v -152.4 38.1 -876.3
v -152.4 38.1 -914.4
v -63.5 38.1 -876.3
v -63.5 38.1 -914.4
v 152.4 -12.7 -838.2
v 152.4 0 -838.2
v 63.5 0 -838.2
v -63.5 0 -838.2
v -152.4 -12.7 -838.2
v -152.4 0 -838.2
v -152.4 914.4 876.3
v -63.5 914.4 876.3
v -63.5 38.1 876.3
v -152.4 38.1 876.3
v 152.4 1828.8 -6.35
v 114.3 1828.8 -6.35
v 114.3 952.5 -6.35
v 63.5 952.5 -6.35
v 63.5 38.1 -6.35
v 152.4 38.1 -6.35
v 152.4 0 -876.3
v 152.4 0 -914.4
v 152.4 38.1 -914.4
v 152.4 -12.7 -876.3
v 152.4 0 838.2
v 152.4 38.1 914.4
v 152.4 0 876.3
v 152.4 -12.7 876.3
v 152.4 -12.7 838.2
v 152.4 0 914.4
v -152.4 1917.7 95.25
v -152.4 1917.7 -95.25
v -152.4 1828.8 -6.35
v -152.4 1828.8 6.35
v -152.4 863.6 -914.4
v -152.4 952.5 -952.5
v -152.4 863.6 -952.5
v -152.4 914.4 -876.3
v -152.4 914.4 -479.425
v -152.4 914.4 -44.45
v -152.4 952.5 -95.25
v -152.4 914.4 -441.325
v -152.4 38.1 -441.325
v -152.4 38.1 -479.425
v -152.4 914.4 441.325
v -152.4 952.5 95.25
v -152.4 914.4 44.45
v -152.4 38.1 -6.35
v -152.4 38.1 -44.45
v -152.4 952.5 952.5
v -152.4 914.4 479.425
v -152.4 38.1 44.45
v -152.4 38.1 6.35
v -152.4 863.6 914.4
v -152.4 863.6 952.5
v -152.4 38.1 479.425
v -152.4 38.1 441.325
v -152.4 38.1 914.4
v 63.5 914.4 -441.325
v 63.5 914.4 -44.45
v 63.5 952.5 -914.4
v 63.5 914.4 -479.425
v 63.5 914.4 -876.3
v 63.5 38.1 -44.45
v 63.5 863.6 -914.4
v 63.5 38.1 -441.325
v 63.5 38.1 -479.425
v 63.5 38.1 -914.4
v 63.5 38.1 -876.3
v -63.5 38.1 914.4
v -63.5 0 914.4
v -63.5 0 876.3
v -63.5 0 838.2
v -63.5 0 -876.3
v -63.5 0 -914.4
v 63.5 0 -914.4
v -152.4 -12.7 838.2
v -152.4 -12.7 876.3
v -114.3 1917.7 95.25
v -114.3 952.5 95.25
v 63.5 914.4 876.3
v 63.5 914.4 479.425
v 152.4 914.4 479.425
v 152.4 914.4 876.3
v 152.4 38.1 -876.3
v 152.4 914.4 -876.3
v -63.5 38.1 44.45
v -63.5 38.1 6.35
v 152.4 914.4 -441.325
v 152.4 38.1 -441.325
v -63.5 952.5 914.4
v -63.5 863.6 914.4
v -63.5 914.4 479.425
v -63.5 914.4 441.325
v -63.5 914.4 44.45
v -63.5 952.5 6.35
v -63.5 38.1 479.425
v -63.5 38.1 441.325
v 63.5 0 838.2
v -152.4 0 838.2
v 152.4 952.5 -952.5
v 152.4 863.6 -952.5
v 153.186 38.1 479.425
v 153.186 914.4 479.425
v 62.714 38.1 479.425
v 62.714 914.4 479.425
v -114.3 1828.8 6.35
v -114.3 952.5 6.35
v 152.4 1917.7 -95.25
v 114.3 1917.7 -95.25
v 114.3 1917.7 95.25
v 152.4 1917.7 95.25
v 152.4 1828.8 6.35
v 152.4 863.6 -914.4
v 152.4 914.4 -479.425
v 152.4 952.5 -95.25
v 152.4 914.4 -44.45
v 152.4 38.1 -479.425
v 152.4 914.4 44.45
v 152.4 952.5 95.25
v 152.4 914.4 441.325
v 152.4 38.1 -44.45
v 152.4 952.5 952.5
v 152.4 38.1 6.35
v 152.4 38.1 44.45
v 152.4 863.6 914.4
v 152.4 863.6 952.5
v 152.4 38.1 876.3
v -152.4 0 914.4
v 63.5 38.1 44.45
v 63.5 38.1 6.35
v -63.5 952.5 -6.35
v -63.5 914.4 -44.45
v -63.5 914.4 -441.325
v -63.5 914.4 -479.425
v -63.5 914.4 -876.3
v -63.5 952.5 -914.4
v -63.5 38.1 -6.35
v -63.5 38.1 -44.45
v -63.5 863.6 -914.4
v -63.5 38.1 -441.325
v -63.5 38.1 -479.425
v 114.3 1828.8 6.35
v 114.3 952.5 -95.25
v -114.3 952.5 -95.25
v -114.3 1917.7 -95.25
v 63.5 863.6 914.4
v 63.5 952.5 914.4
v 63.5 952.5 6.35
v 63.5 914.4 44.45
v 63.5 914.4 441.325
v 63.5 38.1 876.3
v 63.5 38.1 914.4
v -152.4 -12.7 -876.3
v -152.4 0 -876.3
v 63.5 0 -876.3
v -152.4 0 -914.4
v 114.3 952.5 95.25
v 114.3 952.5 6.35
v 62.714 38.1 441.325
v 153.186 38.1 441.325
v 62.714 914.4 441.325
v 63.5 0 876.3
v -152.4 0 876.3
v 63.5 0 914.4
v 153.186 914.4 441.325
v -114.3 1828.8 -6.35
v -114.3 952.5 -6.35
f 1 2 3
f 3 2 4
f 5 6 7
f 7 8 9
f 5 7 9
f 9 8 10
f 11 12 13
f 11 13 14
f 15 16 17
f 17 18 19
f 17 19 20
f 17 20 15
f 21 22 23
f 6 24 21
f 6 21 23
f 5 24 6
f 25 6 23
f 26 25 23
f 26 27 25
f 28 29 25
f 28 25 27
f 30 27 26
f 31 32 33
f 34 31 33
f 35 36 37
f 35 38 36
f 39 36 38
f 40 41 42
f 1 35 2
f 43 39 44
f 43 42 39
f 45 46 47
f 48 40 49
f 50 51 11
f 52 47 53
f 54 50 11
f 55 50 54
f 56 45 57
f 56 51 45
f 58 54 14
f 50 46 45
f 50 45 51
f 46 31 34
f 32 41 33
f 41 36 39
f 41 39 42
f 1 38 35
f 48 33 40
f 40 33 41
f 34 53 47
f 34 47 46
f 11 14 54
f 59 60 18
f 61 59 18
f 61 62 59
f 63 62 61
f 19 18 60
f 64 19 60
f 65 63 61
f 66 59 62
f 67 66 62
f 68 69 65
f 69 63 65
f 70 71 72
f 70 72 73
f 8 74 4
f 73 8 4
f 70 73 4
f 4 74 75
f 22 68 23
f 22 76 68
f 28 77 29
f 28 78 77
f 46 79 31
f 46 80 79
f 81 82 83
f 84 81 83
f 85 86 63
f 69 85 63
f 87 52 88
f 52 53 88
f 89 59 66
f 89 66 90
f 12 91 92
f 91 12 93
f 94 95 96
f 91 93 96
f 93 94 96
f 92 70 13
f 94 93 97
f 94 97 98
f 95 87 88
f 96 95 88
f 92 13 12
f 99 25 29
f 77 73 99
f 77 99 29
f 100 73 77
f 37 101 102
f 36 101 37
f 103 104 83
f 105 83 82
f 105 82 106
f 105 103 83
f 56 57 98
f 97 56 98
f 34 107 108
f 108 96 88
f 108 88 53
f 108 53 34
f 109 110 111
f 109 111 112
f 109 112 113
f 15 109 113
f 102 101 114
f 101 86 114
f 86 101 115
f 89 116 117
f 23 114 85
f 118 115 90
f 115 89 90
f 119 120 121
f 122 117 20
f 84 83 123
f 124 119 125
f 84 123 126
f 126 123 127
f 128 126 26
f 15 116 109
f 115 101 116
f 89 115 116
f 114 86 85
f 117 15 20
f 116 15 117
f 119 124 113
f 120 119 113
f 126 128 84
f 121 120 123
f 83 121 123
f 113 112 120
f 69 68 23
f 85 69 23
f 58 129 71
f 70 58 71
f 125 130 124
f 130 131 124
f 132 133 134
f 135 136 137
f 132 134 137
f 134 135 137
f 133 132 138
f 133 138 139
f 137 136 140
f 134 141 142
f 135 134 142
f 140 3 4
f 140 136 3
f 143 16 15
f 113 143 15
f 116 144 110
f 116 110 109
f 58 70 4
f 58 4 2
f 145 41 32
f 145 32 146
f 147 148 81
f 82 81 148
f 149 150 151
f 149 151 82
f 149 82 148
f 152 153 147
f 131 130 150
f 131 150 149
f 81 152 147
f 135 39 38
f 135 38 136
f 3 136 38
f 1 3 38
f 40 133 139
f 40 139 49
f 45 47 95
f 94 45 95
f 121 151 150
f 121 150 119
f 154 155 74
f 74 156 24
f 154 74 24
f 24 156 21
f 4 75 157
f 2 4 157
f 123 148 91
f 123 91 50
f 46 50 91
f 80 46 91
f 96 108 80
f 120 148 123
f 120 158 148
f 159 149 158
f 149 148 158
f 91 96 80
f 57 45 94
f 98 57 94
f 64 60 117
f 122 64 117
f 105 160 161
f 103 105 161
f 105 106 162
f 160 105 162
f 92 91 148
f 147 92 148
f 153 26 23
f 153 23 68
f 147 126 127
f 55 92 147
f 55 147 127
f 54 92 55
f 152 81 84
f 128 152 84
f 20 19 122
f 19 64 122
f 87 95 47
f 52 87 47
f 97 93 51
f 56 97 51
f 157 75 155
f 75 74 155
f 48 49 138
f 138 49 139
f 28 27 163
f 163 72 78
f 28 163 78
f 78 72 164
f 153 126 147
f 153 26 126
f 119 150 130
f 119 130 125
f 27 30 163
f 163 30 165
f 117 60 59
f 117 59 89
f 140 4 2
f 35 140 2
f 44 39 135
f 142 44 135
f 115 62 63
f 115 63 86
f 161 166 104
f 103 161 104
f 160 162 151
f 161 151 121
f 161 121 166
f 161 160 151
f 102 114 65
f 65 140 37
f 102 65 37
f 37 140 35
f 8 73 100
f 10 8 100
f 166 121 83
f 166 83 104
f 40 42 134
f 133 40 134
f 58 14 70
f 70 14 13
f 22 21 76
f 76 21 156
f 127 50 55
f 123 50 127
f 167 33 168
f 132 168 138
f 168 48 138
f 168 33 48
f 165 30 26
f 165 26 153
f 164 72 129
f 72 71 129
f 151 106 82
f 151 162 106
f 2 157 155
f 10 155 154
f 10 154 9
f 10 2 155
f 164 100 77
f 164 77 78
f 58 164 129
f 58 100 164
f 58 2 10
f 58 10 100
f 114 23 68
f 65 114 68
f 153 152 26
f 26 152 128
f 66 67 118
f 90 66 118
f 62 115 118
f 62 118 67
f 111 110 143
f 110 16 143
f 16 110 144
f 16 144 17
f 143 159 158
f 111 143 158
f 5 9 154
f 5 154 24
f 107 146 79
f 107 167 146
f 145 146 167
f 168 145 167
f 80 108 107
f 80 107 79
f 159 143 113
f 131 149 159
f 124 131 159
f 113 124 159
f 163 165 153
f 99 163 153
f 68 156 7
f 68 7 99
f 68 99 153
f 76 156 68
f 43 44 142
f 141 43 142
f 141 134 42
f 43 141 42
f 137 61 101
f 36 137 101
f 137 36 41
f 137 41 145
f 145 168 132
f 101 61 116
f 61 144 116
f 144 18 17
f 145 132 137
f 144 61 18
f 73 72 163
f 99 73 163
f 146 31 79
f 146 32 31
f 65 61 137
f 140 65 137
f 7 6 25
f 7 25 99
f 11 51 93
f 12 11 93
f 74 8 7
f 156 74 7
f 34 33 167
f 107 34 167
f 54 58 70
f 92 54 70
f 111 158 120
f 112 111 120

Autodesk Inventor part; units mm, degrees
ref_plane "YZ Plane" through (0, 0, 0) normal (1, 0, 0) x (0, 1, 0)
ref_plane "XZ Plane" through (0, 0, 0) normal (0, 1, 0) x (-1, 0, 0)
ref_plane "XY Plane" through (0, 0, 0) normal (0, 0, 1) x (1, 0, 0)
sketch "Sketch1" plane through (0, 0, 0) normal (0, 1, 0) x (-1, 0, 0)
  line L0 (-152.4, 914.4) -> (152.4, 914.4) construction
  line L1 (152.4, 914.4) -> (152.4, -914.4) construction
  line L2 (152.4, -914.4) -> (-152.4, -914.4) construction
  line L3 (-152.4, -914.4) -> (-152.4, 914.4) construction
  line L4 (-152.4, 914.4) -> (152.4, -914.4) construction
  line L5 (152.4, 914.4) -> (-152.4, -914.4) construction
  line L6 (-152.4, 914.4) -> (-63.5, 914.4) construction
  line L7 (-63.5, 914.4) -> (-63.5, -914.4) construction
  line L8 (-63.5, -914.4) -> (-152.4, -914.4) construction
  line L9 (-152.4, -914.4) -> (-152.4, 914.4) construction
  line L10 (-152.4, 914.4) -> (-63.5, 914.4)
  line L11 (-63.5, 914.4) -> (-63.5, -914.4)
  line L12 (-63.5, -914.4) -> (-152.4, -914.4)
  line L13 (-152.4, -914.4) -> (-152.4, 914.4)
  line L14 (152.4, 914.4) -> (63.5, 914.4)
  line L15 (63.5, 914.4) -> (63.5, -914.4)
  line L16 (63.5, -914.4) -> (152.4, -914.4)
  line L17 (152.4, -914.4) -> (152.4, 914.4)
  point P0 (0, 0)
  dimension "d0" = 304.8
  dimension "d1" = 1828.8
  dimension "d2" = 88.9
  dimension "d3" = 88.9
extrude "Extrusion1" add sketch "Sketch1" along normal blind 38.1
sketch "Sketch2" plane through (0, 38.1, 0) normal (0, 1, 0) x (1, 0, 0)
  line L0 (-152.4, -914.4) -> (-63.5, -914.4) projected
  line L1 (-63.5, -914.4) -> (-63.5, 914.4) projected
  line L2 (-152.4, -914.4) -> (-63.5, -914.4)
  line L3 (-63.5, -914.4) -> (-63.5, -876.3)
  line L4 (-63.5, -876.3) -> (-152.4, -876.3)
  line L5 (-152.4, -876.3) -> (-152.4, -914.4)
  line L6 (63.5, -914.4) -> (152.4, -914.4) projected
  line L7 (152.4, -914.4) -> (63.5, -914.4)
  line L8 (63.5, -914.4) -> (63.5, -876.3)
  line L9 (63.5, -876.3) -> (152.4, -876.3)
  line L10 (152.4, -876.3) -> (152.4, -914.4)
  line L11 (-152.4, 914.4) -> (-152.4, -914.4) construction
  line L12 (152.4, -6.35) -> (-152.4, -6.35) construction
  line L13 (-152.4, -6.35) -> (-152.4, 6.35) construction
  line L14 (-152.4, 6.35) -> (152.4, 6.35) construction
  line L15 (152.4, 6.35) -> (152.4, -6.35) construction
  line L16 (152.4, -6.35) -> (-152.4, 6.35) construction
  line L17 (-152.4, -6.35) -> (152.4, 6.35) construction
  line L18 (-152.4, -6.35) -> (-63.5, -6.35)
  line L19 (-63.5, -6.35) -> (-63.5, -44.45)
  line L20 (-63.5, -44.45) -> (-152.4, -44.45)
  line L21 (-152.4, -44.45) -> (-152.4, -6.35)
  line L22 (-152.4, 6.35) -> (-63.5, 6.35)
  line L23 (-63.5, 6.35) -> (-63.5, 44.45)
  line L24 (-63.5, 44.45) -> (-152.4, 44.45)
  line L25 (-152.4, 44.45) -> (-152.4, 6.35)
  line L26 (152.4, 6.35) -> (63.5, 6.35)
  line L27 (63.5, 6.35) -> (63.5, 44.45)
  line L28 (63.5, 44.45) -> (152.4, 44.45)
  line L29 (152.4, 44.45) -> (152.4, 6.35)
  line L30 (152.4, -6.35) -> (63.5, -6.35)
  line L31 (63.5, -6.35) -> (63.5, -44.45)
  line L32 (63.5, -44.45) -> (152.4, -44.45)
  line L33 (152.4, -44.45) -> (152.4, -6.35)
  line L34 (107.95, -876.3) -> (107.95, -44.45) construction
  line L35 (-107.95, -876.3) -> (-107.95, -44.45) construction
  line L36 (153.186, -479.425) -> (62.714, -479.425)
  line L37 (62.714, -479.425) -> (62.714, -441.325)
  line L38 (62.714, -441.325) -> (153.186, -441.325)
  line L39 (153.186, -441.325) -> (153.186, -479.425)
  line L40 (153.186, -479.425) -> (62.714, -441.325) construction
  line L41 (62.714, -479.425) -> (153.186, -441.325) construction
  line L42 (-63.5, -479.425) -> (-152.4, -479.425)
  line L43 (-152.4, -479.425) -> (-152.4, -441.325)
  line L44 (-152.4, -441.325) -> (-63.5, -441.325)
  line L45 (-63.5, -441.325) -> (-63.5, -479.425)
  line L46 (-63.5, -479.425) -> (-152.4, -441.325) construction
  line L47 (-152.4, -479.425) -> (-63.5, -441.325) construction
  line L48 (152.4, 914.4) -> (63.5, 914.4) projected
  line L49 (152.4, -914.4) -> (152.4, 914.4) projected
  line L50 (63.5, 914.4) -> (152.4, 914.4)
  line L51 (152.4, 914.4) -> (152.4, 876.3)
  line L52 (152.4, 876.3) -> (63.5, 876.3)
  line L53 (63.5, 876.3) -> (63.5, 914.4)
  line L54 (-63.5, 914.4) -> (-152.4, 914.4) projected
  line L55 (-63.5, -914.4) -> (-63.5, 914.4) projected
  line L56 (-152.4, 914.4) -> (-63.5, 914.4)
  line L57 (-63.5, 914.4) -> (-63.5, 876.3)
  line L58 (-63.5, 876.3) -> (-152.4, 876.3)
  line L59 (-152.4, 876.3) -> (-152.4, 914.4)
  line L60 (-107.95, 44.45) -> (-107.95, 876.3) construction
  line L61 (107.95, 44.45) -> (107.95, 876.3) construction
  line L62 (-63.5, 441.325) -> (-152.4, 441.325)
  line L63 (-152.4, 441.325) -> (-152.4, 479.425)
  line L64 (-152.4, 479.425) -> (-63.5, 479.425)
  line L65 (-63.5, 479.425) -> (-63.5, 441.325)
  line L66 (-63.5, 441.325) -> (-152.4, 479.425) construction
  line L67 (-152.4, 441.325) -> (-63.5, 479.425) construction
  line L68 (63.5, 441.325) -> (152.4, 441.325)
  line L69 (152.4, 441.325) -> (152.4, 479.425)
  line L70 (152.4, 479.425) -> (63.5, 479.425)
  line L71 (63.5, 479.425) -> (63.5, 441.325)
  line L72 (63.5, 441.325) -> (152.4, 479.425) construction
  line L73 (152.4, 441.325) -> (63.5, 479.425) construction
  point P0 (0, 0)
  point P1 (107.95, -460.375)
  point P2 (-107.95, -460.375)
  point P3 (-107.95, 460.375)
  point P4 (107.95, 460.375)
  dimension "d6" = 38.1
  dimension "d8" = 12.7
  dimension "d9" = 38.1
  dimension "d10" = 38.1
  dimension "d11" = 38.1
  dimension "d17" = 38.1
  dimension "d18" = 38.1
  dimension "d19" = 88.9
  dimension "d20" = 38.1
  dimension "d21" = 88.9
  dimension "d22" = 38.1
  dimension "d23" = 38.1
  dimension "d24" = 88.9
  dimension "d25" = 88.9
  dimension "d26" = 88.9
  dimension "d27" = 38.1
  dimension "d28" = 38.1
extrude "Extrusion3" add sketch "Sketch2" along normal blind 876.3 separate body
sketch "Sketch10" plane through (0, 914.4, 0) normal (0, 1, 0) x (1, 0, 0)
  line L0 (-152.4, -914.4) -> (-63.5, -914.4) projected
  line L1 (-63.5, -6.35) -> (-152.4, -6.35) projected
  line L2 (-152.4, -914.4) -> (-63.5, -914.4)
  line L3 (-63.5, -914.4) -> (-63.5, -6.35)
  line L4 (-63.5, -6.35) -> (-152.4, -6.35)
  line L5 (-152.4, -6.35) -> (-152.4, -914.4)
  line L6 (152.4, -914.4) -> (152.4, -876.3) projected
  line L7 (63.5, -6.35) -> (152.4, -6.35)
  line L8 (152.4, -6.35) -> (152.4, -914.4)
  line L9 (152.4, -914.4) -> (63.5, -914.4)
  line L10 (63.5, -914.4) -> (63.5, -6.35)
  line L11 (-152.4, 6.35) -> (-63.5, 6.35) projected
  line L12 (-63.5, 914.4) -> (-152.4, 914.4) projected
  line L13 (-63.5, 6.35) -> (-152.4, 6.35)
  line L14 (-152.4, 6.35) -> (-152.4, 914.4)
  line L15 (-152.4, 914.4) -> (-63.5, 914.4)
  line L16 (-63.5, 914.4) -> (-63.5, 6.35)
  line L17 (63.5, 6.35) -> (152.4, 6.35) projected
  line L18 (63.5, 914.4) -> (152.4, 914.4)
  line L19 (152.4, 914.4) -> (152.4, 6.35)
  line L20 (152.4, 6.35) -> (63.5, 6.35)
  line L21 (63.5, 6.35) -> (63.5, 914.4)
  point P0 (0, 0)
extrude "Extrusion7" add sketch "Sketch10" along normal blind 38.1 bodies 2
sketch "Sketch11" plane through (0, 952.5, 0) normal (0, 1, 0) x (1, 0, 0)
  line L0 (152.4, 6.35) -> (152.4, 914.4) projected
  line L1 (152.4, 6.35) -> (114.3, 6.35)
  line L2 (114.3, 6.35) -> (114.3, 95.25)
  line L3 (114.3, 95.25) -> (152.4, 95.25)
  line L4 (152.4, 95.25) -> (152.4, 6.35)
  line L5 (152.4, -6.35) -> (63.5, -6.35) projected
  line L6 (152.4, -6.35) -> (114.3, -6.35)
  line L7 (114.3, -6.35) -> (114.3, -95.25)
  line L8 (114.3, -95.25) -> (152.4, -95.25)
  line L9 (152.4, -95.25) -> (152.4, -6.35)
  line L10 (-152.4, 6.35) -> (-63.5, 6.35) projected
  line L11 (-152.4, 6.35) -> (-114.3, 6.35)
  line L12 (-114.3, 6.35) -> (-114.3, 95.25)
  line L13 (-114.3, 95.25) -> (-152.4, 95.25)
  line L14 (-152.4, 95.25) -> (-152.4, 6.35)
  line L15 (-152.4, -6.35) -> (-114.3, -6.35)
  line L16 (-114.3, -6.35) -> (-114.3, -95.25)
  line L17 (-114.3, -95.25) -> (-152.4, -95.25)
  line L18 (-152.4, -95.25) -> (-152.4, -6.35)
  point P0 (0, 0)
  dimension "d52" = 38.1
  dimension "d53" = 88.9
  dimension "d54" = 38.1
  dimension "d55" = 88.9
  dimension "d56" = 38.1
  dimension "d57" = 88.9
  dimension "d58" = 38.1
  dimension "d59" = 88.9
extrude "Extrusion8" add sketch "Sketch11" along normal blind 876.3 bodies 2
sketch "Sketch13" plane through (0, 1828.8, 0) normal (0, 1, 0) x (1, 0, 0)
  line L0 (152.4, -95.25) -> (152.4, -6.35) projected
  line L1 (114.3, 95.25) -> (114.3, 6.35) projected
  line L2 (152.4, -95.25) -> (114.3, -95.25)
  line L3 (114.3, -95.25) -> (114.3, 95.25)
  line L4 (114.3, 95.25) -> (152.4, 95.25)
  line L5 (152.4, 95.25) -> (152.4, -95.25)
  line L6 (-152.4, 95.25) -> (-152.4, 6.35) projected
  line L7 (-152.4, 95.25) -> (-114.3, 95.25)
  line L8 (-114.3, 95.25) -> (-114.3, -95.25)
  line L9 (-114.3, -95.25) -> (-152.4, -95.25)
  line L10 (-152.4, -95.25) -> (-152.4, 95.25)
  point P0 (0, 0)
extrude "Extrusion9" add sketch "Sketch13" along normal blind 88.9 bodies 2
sketch "Sketch16" plane through (0, 0, 0) normal (0, -1, 0) x (1, 0, 0)
  line L0 (-152.4, -876.3) -> (-63.5, -876.3) projected
  line L1 (152.4, 914.4) -> (152.4, -914.4) projected
  line L2 (-152.4, -876.3) -> (152.4, -876.3)
  line L3 (152.4, -876.3) -> (152.4, -838.2)
  line L4 (152.4, -838.2) -> (-152.4, -838.2)
  line L5 (-152.4, -838.2) -> (-152.4, -876.3)
  line L6 (-63.5, 876.3) -> (-152.4, 876.3) projected
  line L7 (-152.4, 876.3) -> (152.4, 876.3)
  line L8 (152.4, 876.3) -> (152.4, 838.2)
  line L9 (152.4, 838.2) -> (-152.4, 838.2)
  line L10 (-152.4, 838.2) -> (-152.4, 876.3)
  point P0 (0, 0)
  dimension "d75" = 38.1
  dimension "d76" = 38.1
extrude "Extrusion11" add sketch "Sketch16" along normal blind 12.7 bodies 1
sketch "Sketch17" plane through (-152.4, 38.1, 914.4) normal (0, 0, 1) x (1, 0, 0)
  line L0 (0, 914.4) -> (88.9, 914.4) projected
  line L1 (304.8, 0) -> (304.8, 914.4) projected
  line L2 (0, 914.4) -> (304.8, 914.4)
  line L3 (304.8, 914.4) -> (304.8, 825.5)
  line L4 (304.8, 825.5) -> (0, 825.5)
  line L5 (0, 825.5) -> (0, 914.4)
  point P0 (152.4, -38.1)
  dimension "d79" = 88.9
extrude "Extrusion12" add sketch "Sketch17" along normal blind 38.1 bodies 2
sketch "Sketch18" plane through (-63.5, 38.1, -914.4) normal (0, 0, -1) x (-1, 0, 0)
  line L0 (88.9, 914.4) -> (88.9, 825.5) projected
  line L1 (-215.9, 825.5) -> (-127, 825.5) projected
  line L2 (88.9, 914.4) -> (-215.9, 914.4)
  line L3 (-215.9, 914.4) -> (-215.9, 825.5)
  line L4 (-215.9, 825.5) -> (88.9, 825.5)
  line L5 (88.9, 825.5) -> (88.9, 914.4)
  point P0 (-63.5, -38.1)
extrude "Extrusion13" add sketch "Sketch18" along normal blind 38.1 bodies 2
sketch "Sketch19" plane through (152.4, 914.4, -44.45) normal (1, 0, 0) x (0, 0, -1)
  line L0 (-38.1, 914.4) -> (-50.8, 914.4) projected
  line L1 (-44.45, 914.4) -> (-44.45, -876.3)
  line L2 (-958.85, -876.3) -> (869.95, -876.3) projected
  point P0 (-44.45, -914.4)
sketch "Sketch20" plane through (-152.4, 914.4, 44.45) normal (-1, 0, 0) x (0, 0, 1)
  line L0 (-50.8, 914.4) -> (-38.1, 914.4) projected
  line L1 (-44.45, 914.4) -> (-44.45, -876.3)
  line L2 (869.95, -876.3) -> (-958.85, -876.3) projected
  point P0 (-44.45, -914.4)
sketch "Sketch21" plane through (152.4, 914.4, -44.45) normal (1, 0, 0) x (0, 0, -1)
  point P0 (-44.45, -914.4)
sketch "Sketch22" plane through (63.5, 38.1, 914.4) normal (0, 0, 1) x (1, 0, 0)
  line L0 (88.9, 0) -> (88.9, 876.3) projected
  line L1 (88.9, 876.3) -> (0, 876.3)
  line L2 (0, 876.3) -> (0, 0)
  line L3 (0, 0) -> (88.9, 0)
  line L4 (88.9, 0) -> (88.9, 876.3)
  point P0 (-63.5, -38.1)
  dimension "d84" = 876.3
sketch "Sketch23" plane through (0, 952.5, 0) normal (0, 1, 0) x (1, 0, 0)
  line L0 (-152.4, 914.4) -> (-63.5, 914.4)
  line L1 (-63.5, 914.4) -> (-63.5, -914.4)
  line L2 (-63.5, -914.4) -> (-152.4, -914.4)
  line L3 (-152.4, -914.4) -> (-152.4, 914.4)
  point P0 (0, 0)
  dimension "d85" = 1828.8
sketch "Sketch24" plane through (0, 38.1, 0) normal (0, 1, 0) x (1, 0, 0)
  point P0 (0, 0)
sketch "Sketch25" plane through (152.4, 914.4, -44.45) normal (1, 0, 0) x (0, 0, -1)
  point P0 (-44.45, -914.4)
sketch "Sketch26" plane through (152.4, 914.4, -44.45) normal (1, 0, 0) x (0, 0, -1)
  line L0 (-139.7, 38.1) -> (-139.7, 1003.3) projected
  line L1 (50.8, 914.4) -> (-139.7, 914.4)
  line L2 (-139.7, 914.4) -> (-139.7, 38.1)
  line L3 (-139.7, 38.1) -> (50.8, 38.1)
  line L4 (50.8, 38.1) -> (50.8, 914.4)
  point P0 (-44.45, -914.4)
  dimension "d87" = 876.3
sketch "Sketch27" plane through (152.4, 914.4, -44.45) normal (1, 0, 0) x (0, 0, -1)
  line L0 (50.8, 38.1) -> (50.8, 1003.3) projected
  line L1 (-139.7, 38.1) -> (-139.7, 1003.3) projected
  line L2 (50.8, 1003.3) -> (-139.7, 1003.3)
  line L3 (-139.7, 1003.3) -> (-139.7, 914.4)
  line L4 (-139.7, 914.4) -> (50.8, 914.4)
  line L5 (50.8, 914.4) -> (50.8, 1003.3)
  point P0 (-44.45, -914.4)
  dimension "d88" = 88.9
  dimension "d89" = 190.5
sketch "Sketch28" plane through (0, -12.7, 0) normal (0, -1, 0) x (1, 0, 0)
  point P0 (0, 0)
sketch "Sketch29" plane through (152.4, 0, -914.4) normal (1, 0, 0) x (0, 0, -1)
  line L0 (-1790.7, 38.1) -> (-1790.7, 914.4) projected
  line L1 (-1355.725, 914.4) -> (-1393.825, 914.4) projected
  line L2 (-1790.7, 914.4) -> (-1393.825, 914.4)
  line L3 (-1828.8, 38.1) -> (-1393.825, 38.1)
  line L4 (-1828.8, 38.1) -> (-1828.8, 863.6) projected
  line L5 (-958.85, 38.1) -> (-958.85, 914.4) projected
  line L6 (-1828.8, 38.1) -> (-958.85, 38.1)
  point P0 (-914.4, 0)
  dimension "d90" = 434.975
  dimension "d91" = 869.95
properties part number "Trebuchet Base"
